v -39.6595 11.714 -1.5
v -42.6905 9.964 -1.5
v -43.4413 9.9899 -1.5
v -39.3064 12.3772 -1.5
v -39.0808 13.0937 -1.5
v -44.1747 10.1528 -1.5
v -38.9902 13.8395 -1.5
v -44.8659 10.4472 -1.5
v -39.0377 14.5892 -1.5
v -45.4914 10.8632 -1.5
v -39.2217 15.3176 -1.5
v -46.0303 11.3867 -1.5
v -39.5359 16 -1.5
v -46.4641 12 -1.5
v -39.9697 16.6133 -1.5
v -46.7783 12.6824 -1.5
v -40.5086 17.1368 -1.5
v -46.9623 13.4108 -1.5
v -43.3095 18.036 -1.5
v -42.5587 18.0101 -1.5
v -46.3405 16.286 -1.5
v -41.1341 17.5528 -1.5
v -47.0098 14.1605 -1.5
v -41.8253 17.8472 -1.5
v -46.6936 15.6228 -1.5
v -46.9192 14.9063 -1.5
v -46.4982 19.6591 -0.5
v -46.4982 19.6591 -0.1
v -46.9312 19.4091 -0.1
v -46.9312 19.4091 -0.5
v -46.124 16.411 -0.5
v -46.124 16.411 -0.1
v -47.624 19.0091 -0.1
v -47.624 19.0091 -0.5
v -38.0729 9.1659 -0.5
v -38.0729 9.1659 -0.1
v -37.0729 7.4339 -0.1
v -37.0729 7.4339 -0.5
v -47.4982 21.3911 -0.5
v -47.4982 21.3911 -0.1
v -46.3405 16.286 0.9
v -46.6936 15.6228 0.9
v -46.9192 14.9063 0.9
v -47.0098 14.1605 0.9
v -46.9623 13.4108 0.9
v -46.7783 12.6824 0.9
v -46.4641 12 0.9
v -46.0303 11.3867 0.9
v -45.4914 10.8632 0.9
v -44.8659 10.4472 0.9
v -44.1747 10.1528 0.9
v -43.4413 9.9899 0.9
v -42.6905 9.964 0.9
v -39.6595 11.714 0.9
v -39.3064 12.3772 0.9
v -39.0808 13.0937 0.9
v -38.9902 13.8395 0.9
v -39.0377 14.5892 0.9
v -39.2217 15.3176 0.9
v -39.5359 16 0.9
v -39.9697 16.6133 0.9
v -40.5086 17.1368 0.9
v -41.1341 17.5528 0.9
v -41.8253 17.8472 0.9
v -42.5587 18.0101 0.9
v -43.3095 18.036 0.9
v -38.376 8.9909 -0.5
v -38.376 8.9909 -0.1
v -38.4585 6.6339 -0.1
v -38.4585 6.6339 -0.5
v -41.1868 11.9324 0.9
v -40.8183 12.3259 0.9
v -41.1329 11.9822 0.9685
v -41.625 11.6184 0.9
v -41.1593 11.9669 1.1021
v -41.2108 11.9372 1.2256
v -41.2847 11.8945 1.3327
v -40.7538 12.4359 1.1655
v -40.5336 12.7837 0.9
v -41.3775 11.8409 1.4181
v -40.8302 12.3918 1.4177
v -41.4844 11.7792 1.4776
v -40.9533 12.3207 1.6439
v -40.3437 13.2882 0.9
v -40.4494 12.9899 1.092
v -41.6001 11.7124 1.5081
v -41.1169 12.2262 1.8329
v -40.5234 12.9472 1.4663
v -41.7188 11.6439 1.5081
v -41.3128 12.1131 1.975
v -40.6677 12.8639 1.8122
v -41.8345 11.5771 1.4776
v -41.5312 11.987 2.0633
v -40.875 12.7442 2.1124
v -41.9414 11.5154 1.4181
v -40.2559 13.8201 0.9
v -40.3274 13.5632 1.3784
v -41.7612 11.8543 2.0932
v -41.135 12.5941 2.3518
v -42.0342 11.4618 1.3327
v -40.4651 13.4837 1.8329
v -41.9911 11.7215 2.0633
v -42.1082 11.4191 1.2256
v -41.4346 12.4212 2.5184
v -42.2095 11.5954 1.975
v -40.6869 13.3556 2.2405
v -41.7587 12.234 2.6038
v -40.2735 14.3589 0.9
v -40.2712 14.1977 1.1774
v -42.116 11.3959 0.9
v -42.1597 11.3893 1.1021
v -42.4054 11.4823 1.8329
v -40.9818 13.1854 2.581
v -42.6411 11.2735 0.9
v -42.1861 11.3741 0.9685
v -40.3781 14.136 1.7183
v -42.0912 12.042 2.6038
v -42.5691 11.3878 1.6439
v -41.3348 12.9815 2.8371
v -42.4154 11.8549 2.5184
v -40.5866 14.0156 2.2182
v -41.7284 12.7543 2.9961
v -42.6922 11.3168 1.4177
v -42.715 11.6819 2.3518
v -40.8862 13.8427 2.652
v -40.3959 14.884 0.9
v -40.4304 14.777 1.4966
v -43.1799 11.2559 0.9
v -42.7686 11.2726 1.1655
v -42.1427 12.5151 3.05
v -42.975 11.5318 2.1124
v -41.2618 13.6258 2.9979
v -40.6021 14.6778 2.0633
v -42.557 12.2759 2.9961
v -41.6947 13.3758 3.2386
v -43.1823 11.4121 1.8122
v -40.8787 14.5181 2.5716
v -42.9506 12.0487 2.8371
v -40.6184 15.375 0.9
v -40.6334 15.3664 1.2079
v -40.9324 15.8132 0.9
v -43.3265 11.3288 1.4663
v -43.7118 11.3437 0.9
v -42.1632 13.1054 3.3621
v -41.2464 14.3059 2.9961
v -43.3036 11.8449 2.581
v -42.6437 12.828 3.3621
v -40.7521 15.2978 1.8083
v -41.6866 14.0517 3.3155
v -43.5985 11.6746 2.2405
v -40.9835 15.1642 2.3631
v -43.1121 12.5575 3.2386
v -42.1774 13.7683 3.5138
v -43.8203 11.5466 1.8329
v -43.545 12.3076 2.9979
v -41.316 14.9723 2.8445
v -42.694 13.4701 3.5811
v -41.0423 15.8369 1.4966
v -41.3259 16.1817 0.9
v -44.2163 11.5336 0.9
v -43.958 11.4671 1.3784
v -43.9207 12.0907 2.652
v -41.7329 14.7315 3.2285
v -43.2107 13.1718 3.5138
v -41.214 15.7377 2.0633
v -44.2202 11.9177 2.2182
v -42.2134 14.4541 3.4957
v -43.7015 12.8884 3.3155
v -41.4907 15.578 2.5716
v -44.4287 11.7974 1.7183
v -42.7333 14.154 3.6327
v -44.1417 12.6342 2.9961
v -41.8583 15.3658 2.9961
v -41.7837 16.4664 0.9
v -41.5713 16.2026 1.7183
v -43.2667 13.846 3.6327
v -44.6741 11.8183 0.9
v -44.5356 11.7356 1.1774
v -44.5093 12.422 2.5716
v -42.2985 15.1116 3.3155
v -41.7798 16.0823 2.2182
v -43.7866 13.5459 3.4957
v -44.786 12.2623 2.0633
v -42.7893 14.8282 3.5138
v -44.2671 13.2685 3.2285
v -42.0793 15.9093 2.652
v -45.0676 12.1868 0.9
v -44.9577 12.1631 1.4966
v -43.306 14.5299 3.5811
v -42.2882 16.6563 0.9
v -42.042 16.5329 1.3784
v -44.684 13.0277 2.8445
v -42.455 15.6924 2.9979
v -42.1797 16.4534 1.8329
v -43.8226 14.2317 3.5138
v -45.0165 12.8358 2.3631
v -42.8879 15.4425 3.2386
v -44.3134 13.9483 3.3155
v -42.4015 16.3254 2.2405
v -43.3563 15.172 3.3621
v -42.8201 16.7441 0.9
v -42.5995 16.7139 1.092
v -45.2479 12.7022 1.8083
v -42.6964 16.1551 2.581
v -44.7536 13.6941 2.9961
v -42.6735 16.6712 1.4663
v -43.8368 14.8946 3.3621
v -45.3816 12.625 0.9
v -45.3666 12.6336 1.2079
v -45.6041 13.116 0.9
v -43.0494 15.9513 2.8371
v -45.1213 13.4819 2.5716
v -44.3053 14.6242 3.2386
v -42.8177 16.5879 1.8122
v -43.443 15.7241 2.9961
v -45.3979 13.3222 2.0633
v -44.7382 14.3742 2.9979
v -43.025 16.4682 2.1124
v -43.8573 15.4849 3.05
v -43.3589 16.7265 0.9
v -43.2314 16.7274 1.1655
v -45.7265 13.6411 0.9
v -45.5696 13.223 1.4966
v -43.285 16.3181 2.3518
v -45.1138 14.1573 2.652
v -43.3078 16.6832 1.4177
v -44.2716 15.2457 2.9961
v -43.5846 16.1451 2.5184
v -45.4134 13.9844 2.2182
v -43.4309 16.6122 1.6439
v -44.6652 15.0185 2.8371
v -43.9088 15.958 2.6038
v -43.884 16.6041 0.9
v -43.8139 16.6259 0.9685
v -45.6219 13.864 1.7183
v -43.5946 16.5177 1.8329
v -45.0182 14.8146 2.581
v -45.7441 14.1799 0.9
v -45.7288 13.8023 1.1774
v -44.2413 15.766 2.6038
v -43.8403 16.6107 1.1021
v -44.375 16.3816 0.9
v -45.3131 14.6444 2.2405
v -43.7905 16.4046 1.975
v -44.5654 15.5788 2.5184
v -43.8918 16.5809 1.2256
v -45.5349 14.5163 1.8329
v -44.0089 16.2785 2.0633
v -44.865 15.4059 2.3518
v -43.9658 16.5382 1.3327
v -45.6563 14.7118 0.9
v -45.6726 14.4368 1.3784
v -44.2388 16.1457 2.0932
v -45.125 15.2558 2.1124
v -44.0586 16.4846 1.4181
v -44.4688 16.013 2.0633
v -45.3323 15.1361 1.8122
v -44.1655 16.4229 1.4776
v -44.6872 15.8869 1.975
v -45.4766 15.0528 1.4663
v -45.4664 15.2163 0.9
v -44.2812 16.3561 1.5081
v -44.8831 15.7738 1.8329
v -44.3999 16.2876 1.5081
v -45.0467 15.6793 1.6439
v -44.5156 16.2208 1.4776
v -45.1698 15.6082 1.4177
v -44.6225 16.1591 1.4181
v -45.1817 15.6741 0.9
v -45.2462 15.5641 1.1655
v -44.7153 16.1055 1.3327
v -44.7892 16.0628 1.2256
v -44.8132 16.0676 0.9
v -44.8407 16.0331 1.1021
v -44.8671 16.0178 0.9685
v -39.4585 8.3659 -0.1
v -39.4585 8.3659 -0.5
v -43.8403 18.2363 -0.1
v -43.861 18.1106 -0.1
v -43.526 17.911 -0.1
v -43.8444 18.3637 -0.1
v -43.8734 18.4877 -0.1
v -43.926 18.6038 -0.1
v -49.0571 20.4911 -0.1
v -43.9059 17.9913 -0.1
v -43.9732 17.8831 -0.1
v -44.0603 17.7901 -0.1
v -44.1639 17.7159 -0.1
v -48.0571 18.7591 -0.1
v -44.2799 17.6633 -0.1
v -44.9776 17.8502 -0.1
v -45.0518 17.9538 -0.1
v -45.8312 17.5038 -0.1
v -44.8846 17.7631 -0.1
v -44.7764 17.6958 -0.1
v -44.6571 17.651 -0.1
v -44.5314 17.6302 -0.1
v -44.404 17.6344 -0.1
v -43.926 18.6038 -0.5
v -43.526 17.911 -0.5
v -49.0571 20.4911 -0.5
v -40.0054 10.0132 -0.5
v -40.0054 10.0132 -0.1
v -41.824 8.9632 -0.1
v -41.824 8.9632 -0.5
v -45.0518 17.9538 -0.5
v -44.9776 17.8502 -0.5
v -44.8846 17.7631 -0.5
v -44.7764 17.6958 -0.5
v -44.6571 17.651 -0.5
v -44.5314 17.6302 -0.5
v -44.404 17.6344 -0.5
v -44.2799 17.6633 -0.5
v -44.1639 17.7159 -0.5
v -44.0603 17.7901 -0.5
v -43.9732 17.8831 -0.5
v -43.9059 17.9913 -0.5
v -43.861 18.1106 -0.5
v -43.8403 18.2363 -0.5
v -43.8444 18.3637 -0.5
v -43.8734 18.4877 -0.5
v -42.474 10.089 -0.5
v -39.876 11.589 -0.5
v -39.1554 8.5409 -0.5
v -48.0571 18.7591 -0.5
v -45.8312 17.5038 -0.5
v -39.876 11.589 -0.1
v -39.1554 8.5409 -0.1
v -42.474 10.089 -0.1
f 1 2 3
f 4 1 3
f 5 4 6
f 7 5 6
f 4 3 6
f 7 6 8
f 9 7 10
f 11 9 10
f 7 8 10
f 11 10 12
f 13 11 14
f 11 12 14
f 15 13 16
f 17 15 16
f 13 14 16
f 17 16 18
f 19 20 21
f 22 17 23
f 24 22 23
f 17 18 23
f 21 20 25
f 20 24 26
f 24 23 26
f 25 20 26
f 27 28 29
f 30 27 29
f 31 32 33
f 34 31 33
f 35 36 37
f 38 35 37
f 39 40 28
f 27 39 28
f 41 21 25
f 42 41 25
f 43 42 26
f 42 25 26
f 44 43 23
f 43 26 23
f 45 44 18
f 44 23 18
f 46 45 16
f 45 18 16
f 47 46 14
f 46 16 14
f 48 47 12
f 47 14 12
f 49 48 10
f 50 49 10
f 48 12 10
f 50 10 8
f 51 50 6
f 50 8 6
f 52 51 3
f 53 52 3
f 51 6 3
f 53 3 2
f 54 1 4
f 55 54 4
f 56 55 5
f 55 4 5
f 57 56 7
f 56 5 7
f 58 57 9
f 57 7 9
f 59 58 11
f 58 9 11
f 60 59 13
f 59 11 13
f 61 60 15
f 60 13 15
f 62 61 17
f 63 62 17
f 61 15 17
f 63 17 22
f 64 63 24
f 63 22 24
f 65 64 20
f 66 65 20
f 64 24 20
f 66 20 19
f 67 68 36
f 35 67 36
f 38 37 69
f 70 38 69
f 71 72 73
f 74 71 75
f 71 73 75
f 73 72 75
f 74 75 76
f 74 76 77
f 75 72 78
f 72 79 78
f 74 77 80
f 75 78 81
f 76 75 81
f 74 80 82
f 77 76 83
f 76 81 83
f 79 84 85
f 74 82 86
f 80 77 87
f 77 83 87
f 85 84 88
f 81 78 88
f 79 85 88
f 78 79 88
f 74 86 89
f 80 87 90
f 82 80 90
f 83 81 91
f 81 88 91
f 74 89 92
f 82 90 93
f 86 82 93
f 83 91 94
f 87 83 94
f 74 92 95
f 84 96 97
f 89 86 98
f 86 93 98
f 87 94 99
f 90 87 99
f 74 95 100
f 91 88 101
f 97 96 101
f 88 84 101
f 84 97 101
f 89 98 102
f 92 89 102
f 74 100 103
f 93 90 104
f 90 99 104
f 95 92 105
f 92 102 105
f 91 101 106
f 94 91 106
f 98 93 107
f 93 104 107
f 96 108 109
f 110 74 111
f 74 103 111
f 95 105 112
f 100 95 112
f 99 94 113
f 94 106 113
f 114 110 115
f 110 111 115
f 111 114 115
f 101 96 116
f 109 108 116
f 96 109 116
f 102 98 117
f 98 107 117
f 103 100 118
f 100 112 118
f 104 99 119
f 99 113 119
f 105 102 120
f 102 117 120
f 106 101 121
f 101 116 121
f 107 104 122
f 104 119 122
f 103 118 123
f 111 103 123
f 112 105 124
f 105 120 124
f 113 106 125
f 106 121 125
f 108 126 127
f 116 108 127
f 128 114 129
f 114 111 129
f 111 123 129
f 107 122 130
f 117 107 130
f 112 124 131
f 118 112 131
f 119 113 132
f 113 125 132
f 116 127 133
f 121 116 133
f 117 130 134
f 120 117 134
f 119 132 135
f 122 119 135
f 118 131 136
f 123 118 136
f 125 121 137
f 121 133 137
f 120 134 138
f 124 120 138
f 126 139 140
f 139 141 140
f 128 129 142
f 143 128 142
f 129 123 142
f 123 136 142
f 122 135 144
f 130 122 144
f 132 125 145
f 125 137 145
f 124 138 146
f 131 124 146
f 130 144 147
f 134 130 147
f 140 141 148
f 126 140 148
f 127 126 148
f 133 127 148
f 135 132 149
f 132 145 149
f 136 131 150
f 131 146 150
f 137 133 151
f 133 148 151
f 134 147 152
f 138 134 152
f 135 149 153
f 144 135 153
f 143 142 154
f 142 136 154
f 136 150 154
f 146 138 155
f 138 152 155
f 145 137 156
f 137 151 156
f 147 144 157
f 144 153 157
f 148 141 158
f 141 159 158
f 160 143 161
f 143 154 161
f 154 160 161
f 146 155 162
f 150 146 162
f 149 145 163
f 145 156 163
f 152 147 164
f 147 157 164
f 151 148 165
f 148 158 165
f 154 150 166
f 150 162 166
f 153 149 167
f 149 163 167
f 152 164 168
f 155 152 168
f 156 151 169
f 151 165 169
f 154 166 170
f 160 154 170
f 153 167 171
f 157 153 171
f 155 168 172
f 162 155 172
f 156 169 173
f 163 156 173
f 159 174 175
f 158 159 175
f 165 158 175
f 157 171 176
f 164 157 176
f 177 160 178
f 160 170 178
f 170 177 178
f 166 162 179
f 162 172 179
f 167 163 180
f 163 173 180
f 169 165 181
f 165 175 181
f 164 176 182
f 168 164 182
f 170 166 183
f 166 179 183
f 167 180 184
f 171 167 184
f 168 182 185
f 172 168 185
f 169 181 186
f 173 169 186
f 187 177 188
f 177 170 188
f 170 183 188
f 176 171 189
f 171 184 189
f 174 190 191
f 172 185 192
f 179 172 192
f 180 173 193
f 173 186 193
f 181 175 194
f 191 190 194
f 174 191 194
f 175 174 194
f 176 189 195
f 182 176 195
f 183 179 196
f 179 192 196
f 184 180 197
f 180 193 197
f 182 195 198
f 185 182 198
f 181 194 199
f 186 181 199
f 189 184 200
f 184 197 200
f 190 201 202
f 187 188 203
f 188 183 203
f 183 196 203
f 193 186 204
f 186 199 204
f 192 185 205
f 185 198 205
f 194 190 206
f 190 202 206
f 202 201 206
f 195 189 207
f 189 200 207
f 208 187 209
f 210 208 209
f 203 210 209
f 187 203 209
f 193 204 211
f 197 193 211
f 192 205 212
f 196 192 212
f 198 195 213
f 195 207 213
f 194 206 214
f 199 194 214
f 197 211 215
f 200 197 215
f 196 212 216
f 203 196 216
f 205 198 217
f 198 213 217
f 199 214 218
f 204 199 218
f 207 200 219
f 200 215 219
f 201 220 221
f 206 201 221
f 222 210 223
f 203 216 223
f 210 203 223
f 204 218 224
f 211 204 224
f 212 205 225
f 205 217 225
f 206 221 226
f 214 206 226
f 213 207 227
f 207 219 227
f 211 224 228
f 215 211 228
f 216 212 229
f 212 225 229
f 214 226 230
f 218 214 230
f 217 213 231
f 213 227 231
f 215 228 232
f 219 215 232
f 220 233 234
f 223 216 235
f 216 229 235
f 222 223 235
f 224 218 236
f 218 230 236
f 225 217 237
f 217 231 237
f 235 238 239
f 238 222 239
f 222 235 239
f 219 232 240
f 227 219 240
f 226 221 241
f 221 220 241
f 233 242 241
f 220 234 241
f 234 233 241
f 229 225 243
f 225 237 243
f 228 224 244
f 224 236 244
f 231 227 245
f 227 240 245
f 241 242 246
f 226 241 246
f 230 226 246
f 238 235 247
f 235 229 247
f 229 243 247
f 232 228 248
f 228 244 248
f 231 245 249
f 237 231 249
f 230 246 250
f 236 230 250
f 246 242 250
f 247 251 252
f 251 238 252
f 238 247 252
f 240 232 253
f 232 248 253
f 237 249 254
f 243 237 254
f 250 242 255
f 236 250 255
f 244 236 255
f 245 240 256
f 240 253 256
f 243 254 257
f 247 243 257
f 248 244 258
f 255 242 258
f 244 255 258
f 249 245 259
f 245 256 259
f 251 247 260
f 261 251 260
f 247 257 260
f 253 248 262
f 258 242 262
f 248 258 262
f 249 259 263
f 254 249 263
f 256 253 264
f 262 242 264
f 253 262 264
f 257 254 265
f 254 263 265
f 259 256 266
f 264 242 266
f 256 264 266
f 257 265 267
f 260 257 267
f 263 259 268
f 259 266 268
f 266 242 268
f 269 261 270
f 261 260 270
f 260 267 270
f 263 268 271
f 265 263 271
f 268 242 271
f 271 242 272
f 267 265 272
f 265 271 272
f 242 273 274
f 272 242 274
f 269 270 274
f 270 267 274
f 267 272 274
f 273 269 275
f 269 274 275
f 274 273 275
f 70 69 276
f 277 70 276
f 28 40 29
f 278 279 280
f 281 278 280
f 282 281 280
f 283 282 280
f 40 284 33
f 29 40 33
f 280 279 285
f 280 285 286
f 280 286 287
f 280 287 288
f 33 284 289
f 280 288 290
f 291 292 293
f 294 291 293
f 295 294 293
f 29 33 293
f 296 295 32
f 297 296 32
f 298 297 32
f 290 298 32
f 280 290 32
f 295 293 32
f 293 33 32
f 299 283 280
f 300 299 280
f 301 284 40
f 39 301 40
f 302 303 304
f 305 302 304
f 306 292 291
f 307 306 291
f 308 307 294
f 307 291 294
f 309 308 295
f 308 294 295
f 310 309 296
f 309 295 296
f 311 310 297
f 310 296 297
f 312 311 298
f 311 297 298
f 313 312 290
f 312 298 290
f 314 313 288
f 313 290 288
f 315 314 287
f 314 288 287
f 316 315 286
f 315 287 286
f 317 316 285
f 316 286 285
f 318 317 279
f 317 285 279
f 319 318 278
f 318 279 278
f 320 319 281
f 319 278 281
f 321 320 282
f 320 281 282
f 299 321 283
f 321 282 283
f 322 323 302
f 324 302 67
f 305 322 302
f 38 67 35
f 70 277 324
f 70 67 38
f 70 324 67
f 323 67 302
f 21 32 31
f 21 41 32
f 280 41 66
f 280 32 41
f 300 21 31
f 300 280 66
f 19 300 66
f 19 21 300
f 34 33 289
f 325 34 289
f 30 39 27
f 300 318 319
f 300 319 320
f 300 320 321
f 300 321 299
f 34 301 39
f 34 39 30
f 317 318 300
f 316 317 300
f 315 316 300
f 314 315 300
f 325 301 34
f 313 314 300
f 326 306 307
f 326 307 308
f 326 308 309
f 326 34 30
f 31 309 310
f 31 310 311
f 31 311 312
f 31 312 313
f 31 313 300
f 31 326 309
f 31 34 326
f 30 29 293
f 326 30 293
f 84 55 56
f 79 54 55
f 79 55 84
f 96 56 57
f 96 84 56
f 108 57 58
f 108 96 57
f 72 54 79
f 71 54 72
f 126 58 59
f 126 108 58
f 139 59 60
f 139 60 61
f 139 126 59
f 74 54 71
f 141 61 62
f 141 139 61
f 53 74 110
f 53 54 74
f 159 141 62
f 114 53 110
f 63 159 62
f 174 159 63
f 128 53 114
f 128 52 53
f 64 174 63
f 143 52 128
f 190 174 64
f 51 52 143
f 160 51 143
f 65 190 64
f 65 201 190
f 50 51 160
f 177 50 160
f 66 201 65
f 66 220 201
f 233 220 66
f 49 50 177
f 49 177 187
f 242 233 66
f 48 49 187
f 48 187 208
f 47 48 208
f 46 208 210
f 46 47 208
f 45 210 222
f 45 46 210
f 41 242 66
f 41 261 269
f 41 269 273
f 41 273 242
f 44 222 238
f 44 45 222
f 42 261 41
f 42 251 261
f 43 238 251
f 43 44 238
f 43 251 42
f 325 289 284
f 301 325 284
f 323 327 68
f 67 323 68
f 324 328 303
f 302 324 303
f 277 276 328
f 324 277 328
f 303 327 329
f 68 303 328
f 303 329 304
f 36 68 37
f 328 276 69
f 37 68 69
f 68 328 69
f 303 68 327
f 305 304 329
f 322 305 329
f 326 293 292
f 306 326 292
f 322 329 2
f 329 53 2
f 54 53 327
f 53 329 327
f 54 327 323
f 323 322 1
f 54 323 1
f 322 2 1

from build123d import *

# Parameters (mm, degrees)
REVOLUTION001_ANGLE       = -180
PAD015_DEPTH              = 0.4
BODY012_PLACEMENT_ANGLE   = 180
PAD014_DEPTH              = 2.4
FUSION002_PLACEMENT_ANGLE = 120


with BuildPart() as light001:
    # Sketch024 (on Face1 of ShapeBinder003) → Revolution001 (revolve)
    with BuildSketch(Plane.XY.offset(2.4)):
        with BuildLine():
            ThreePointArc((-2.75, 0), (0, -2.75), (2.75, 0))
            Line((-2.75, 0), (2.75, 0))
        make_face()
    revolve(axis=Axis((-2.75, 0, 2.4), (1, 0, 0)), revolution_arc=REVOLUTION001_ANGLE)


with BuildPart() as body012:
    # Sketch025 (on Face1 of ShapeBinder004) → Pad015 (new body)
    with BuildSketch(Plane(origin=(0, 0, 0), x_dir=(1, 0, 0), z_dir=(0, 0, -1))):
        with BuildLine():
            Line((3.65, 1.5), (6.65, 1.5))
            Line((6.65, 1.5), (6.65, 2))
            Line((6.65, 2), (8.65, 2))
            Line((8.65, 2), (8.65, 0.2))
            Line((8.65, 0.2), (6.65, 0.2))
            Line((6.65, 0.2), (6.65, 0.7))
            Line((6.65, 0.7), (4.45, 0.7))
            Line((4.45, 0.7), (4.45, -0.2))
            ThreePointArc((4.45, -0.2), (3.8, -0.85), (4.45, -1.5))
            Line((4.45, -1.5), (-6.65, -1.5))
            Line((-6.65, -1.5), (-6.65, -1.85))
            Line((-6.65, -1.85), (-8.65, -1.85))
            Line((-8.65, -1.85), (-8.65, -0.25))
            Line((-8.65, -0.25), (-6.65, -0.25))
            Line((-6.65, -0.25), (-6.65, -0.6))
            Line((-6.65, -0.6), (-4.95, -0.6))
            Line((-4.95, -0.6), (-4.95, 1.5))
            Line((-4.95, 1.5), (3.65, 1.5))
        make_face()
    extrude(amount=-PAD015_DEPTH)


with BuildPart() as body012_1:
    # Body012 placement: moved
    add(body012.part.moved(Location((0, 0, 1.4))).rotate(Axis((0, 0, 1.4), (1, 0, 0)), BODY012_PLACEMENT_ANGLE))


with BuildPart() as led2:
    # Sketch023 → Pad014 (new body)
    with BuildSketch(Plane.XY):
        with BuildLine():
            Line((-3.65, 1.75), (-3.65, -1.75))
            ThreePointArc((-3.65, -1.75), (0, -4), (3.65, -1.75))
            Line((3.65, 1.75), (3.65, -1.75))
            ThreePointArc((3.65, 1.75), (0, 4), (-3.65, 1.75))
        make_face()
    extrude(amount=PAD014_DEPTH)

    # Fusion002: union light001, Body012
    add(light001.part)
    add(body012_1.part)


with BuildPart() as led2_1:
    # Fusion002 placement: moved
    add(led2.part.moved(Location((-43, 14, -1.5))).rotate(Axis((-43, 14, -1.5), (0, 0, 1)), FUSION002_PLACEMENT_ANGLE))


solid = led2_1.part
